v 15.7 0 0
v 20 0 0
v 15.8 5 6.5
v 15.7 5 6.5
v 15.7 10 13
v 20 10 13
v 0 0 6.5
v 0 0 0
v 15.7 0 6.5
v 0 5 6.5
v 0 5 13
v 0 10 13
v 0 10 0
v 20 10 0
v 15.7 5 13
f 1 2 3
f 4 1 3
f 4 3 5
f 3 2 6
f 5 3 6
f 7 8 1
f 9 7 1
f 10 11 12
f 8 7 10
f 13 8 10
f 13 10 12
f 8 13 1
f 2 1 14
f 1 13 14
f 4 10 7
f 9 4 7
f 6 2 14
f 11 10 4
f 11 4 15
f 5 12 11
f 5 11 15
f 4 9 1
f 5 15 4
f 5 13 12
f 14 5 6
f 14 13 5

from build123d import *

# Parameters (mm, degrees)
F0_W     = 20
F0_H     = 10
F1_DEPTH = 13
F3_DEPTH = 4.3
F4_W     = 5
F4_H     = 6.5
F5_DEPTH = 15.8


with BuildPart() as f1:
    # F0 (on Top) → F1 (new body)
    with BuildSketch(Plane.XY):
        with Locations((10, 5)):
            Rectangle(F0_W, F0_H)
    extrude(amount=F1_DEPTH)

    # F2 (on face) → F3 (cut)
    with BuildSketch(Plane.YZ.offset(20)):
        Polygon((0, 13), (0, 0), (10, 13), align=None)
    extrude(amount=-F3_DEPTH, mode=Mode.SUBTRACT)

    # F4 (on face) → F5 (cut)
    with BuildSketch(Plane(origin=(0, 0, 0), x_dir=(0, -1, 0), z_dir=(-1, 0, 0))):
        with Locations((-2.5, 9.75)):
            Rectangle(F4_W, F4_H)
    extrude(amount=-F5_DEPTH, mode=Mode.SUBTRACT)


solid = f1.part
